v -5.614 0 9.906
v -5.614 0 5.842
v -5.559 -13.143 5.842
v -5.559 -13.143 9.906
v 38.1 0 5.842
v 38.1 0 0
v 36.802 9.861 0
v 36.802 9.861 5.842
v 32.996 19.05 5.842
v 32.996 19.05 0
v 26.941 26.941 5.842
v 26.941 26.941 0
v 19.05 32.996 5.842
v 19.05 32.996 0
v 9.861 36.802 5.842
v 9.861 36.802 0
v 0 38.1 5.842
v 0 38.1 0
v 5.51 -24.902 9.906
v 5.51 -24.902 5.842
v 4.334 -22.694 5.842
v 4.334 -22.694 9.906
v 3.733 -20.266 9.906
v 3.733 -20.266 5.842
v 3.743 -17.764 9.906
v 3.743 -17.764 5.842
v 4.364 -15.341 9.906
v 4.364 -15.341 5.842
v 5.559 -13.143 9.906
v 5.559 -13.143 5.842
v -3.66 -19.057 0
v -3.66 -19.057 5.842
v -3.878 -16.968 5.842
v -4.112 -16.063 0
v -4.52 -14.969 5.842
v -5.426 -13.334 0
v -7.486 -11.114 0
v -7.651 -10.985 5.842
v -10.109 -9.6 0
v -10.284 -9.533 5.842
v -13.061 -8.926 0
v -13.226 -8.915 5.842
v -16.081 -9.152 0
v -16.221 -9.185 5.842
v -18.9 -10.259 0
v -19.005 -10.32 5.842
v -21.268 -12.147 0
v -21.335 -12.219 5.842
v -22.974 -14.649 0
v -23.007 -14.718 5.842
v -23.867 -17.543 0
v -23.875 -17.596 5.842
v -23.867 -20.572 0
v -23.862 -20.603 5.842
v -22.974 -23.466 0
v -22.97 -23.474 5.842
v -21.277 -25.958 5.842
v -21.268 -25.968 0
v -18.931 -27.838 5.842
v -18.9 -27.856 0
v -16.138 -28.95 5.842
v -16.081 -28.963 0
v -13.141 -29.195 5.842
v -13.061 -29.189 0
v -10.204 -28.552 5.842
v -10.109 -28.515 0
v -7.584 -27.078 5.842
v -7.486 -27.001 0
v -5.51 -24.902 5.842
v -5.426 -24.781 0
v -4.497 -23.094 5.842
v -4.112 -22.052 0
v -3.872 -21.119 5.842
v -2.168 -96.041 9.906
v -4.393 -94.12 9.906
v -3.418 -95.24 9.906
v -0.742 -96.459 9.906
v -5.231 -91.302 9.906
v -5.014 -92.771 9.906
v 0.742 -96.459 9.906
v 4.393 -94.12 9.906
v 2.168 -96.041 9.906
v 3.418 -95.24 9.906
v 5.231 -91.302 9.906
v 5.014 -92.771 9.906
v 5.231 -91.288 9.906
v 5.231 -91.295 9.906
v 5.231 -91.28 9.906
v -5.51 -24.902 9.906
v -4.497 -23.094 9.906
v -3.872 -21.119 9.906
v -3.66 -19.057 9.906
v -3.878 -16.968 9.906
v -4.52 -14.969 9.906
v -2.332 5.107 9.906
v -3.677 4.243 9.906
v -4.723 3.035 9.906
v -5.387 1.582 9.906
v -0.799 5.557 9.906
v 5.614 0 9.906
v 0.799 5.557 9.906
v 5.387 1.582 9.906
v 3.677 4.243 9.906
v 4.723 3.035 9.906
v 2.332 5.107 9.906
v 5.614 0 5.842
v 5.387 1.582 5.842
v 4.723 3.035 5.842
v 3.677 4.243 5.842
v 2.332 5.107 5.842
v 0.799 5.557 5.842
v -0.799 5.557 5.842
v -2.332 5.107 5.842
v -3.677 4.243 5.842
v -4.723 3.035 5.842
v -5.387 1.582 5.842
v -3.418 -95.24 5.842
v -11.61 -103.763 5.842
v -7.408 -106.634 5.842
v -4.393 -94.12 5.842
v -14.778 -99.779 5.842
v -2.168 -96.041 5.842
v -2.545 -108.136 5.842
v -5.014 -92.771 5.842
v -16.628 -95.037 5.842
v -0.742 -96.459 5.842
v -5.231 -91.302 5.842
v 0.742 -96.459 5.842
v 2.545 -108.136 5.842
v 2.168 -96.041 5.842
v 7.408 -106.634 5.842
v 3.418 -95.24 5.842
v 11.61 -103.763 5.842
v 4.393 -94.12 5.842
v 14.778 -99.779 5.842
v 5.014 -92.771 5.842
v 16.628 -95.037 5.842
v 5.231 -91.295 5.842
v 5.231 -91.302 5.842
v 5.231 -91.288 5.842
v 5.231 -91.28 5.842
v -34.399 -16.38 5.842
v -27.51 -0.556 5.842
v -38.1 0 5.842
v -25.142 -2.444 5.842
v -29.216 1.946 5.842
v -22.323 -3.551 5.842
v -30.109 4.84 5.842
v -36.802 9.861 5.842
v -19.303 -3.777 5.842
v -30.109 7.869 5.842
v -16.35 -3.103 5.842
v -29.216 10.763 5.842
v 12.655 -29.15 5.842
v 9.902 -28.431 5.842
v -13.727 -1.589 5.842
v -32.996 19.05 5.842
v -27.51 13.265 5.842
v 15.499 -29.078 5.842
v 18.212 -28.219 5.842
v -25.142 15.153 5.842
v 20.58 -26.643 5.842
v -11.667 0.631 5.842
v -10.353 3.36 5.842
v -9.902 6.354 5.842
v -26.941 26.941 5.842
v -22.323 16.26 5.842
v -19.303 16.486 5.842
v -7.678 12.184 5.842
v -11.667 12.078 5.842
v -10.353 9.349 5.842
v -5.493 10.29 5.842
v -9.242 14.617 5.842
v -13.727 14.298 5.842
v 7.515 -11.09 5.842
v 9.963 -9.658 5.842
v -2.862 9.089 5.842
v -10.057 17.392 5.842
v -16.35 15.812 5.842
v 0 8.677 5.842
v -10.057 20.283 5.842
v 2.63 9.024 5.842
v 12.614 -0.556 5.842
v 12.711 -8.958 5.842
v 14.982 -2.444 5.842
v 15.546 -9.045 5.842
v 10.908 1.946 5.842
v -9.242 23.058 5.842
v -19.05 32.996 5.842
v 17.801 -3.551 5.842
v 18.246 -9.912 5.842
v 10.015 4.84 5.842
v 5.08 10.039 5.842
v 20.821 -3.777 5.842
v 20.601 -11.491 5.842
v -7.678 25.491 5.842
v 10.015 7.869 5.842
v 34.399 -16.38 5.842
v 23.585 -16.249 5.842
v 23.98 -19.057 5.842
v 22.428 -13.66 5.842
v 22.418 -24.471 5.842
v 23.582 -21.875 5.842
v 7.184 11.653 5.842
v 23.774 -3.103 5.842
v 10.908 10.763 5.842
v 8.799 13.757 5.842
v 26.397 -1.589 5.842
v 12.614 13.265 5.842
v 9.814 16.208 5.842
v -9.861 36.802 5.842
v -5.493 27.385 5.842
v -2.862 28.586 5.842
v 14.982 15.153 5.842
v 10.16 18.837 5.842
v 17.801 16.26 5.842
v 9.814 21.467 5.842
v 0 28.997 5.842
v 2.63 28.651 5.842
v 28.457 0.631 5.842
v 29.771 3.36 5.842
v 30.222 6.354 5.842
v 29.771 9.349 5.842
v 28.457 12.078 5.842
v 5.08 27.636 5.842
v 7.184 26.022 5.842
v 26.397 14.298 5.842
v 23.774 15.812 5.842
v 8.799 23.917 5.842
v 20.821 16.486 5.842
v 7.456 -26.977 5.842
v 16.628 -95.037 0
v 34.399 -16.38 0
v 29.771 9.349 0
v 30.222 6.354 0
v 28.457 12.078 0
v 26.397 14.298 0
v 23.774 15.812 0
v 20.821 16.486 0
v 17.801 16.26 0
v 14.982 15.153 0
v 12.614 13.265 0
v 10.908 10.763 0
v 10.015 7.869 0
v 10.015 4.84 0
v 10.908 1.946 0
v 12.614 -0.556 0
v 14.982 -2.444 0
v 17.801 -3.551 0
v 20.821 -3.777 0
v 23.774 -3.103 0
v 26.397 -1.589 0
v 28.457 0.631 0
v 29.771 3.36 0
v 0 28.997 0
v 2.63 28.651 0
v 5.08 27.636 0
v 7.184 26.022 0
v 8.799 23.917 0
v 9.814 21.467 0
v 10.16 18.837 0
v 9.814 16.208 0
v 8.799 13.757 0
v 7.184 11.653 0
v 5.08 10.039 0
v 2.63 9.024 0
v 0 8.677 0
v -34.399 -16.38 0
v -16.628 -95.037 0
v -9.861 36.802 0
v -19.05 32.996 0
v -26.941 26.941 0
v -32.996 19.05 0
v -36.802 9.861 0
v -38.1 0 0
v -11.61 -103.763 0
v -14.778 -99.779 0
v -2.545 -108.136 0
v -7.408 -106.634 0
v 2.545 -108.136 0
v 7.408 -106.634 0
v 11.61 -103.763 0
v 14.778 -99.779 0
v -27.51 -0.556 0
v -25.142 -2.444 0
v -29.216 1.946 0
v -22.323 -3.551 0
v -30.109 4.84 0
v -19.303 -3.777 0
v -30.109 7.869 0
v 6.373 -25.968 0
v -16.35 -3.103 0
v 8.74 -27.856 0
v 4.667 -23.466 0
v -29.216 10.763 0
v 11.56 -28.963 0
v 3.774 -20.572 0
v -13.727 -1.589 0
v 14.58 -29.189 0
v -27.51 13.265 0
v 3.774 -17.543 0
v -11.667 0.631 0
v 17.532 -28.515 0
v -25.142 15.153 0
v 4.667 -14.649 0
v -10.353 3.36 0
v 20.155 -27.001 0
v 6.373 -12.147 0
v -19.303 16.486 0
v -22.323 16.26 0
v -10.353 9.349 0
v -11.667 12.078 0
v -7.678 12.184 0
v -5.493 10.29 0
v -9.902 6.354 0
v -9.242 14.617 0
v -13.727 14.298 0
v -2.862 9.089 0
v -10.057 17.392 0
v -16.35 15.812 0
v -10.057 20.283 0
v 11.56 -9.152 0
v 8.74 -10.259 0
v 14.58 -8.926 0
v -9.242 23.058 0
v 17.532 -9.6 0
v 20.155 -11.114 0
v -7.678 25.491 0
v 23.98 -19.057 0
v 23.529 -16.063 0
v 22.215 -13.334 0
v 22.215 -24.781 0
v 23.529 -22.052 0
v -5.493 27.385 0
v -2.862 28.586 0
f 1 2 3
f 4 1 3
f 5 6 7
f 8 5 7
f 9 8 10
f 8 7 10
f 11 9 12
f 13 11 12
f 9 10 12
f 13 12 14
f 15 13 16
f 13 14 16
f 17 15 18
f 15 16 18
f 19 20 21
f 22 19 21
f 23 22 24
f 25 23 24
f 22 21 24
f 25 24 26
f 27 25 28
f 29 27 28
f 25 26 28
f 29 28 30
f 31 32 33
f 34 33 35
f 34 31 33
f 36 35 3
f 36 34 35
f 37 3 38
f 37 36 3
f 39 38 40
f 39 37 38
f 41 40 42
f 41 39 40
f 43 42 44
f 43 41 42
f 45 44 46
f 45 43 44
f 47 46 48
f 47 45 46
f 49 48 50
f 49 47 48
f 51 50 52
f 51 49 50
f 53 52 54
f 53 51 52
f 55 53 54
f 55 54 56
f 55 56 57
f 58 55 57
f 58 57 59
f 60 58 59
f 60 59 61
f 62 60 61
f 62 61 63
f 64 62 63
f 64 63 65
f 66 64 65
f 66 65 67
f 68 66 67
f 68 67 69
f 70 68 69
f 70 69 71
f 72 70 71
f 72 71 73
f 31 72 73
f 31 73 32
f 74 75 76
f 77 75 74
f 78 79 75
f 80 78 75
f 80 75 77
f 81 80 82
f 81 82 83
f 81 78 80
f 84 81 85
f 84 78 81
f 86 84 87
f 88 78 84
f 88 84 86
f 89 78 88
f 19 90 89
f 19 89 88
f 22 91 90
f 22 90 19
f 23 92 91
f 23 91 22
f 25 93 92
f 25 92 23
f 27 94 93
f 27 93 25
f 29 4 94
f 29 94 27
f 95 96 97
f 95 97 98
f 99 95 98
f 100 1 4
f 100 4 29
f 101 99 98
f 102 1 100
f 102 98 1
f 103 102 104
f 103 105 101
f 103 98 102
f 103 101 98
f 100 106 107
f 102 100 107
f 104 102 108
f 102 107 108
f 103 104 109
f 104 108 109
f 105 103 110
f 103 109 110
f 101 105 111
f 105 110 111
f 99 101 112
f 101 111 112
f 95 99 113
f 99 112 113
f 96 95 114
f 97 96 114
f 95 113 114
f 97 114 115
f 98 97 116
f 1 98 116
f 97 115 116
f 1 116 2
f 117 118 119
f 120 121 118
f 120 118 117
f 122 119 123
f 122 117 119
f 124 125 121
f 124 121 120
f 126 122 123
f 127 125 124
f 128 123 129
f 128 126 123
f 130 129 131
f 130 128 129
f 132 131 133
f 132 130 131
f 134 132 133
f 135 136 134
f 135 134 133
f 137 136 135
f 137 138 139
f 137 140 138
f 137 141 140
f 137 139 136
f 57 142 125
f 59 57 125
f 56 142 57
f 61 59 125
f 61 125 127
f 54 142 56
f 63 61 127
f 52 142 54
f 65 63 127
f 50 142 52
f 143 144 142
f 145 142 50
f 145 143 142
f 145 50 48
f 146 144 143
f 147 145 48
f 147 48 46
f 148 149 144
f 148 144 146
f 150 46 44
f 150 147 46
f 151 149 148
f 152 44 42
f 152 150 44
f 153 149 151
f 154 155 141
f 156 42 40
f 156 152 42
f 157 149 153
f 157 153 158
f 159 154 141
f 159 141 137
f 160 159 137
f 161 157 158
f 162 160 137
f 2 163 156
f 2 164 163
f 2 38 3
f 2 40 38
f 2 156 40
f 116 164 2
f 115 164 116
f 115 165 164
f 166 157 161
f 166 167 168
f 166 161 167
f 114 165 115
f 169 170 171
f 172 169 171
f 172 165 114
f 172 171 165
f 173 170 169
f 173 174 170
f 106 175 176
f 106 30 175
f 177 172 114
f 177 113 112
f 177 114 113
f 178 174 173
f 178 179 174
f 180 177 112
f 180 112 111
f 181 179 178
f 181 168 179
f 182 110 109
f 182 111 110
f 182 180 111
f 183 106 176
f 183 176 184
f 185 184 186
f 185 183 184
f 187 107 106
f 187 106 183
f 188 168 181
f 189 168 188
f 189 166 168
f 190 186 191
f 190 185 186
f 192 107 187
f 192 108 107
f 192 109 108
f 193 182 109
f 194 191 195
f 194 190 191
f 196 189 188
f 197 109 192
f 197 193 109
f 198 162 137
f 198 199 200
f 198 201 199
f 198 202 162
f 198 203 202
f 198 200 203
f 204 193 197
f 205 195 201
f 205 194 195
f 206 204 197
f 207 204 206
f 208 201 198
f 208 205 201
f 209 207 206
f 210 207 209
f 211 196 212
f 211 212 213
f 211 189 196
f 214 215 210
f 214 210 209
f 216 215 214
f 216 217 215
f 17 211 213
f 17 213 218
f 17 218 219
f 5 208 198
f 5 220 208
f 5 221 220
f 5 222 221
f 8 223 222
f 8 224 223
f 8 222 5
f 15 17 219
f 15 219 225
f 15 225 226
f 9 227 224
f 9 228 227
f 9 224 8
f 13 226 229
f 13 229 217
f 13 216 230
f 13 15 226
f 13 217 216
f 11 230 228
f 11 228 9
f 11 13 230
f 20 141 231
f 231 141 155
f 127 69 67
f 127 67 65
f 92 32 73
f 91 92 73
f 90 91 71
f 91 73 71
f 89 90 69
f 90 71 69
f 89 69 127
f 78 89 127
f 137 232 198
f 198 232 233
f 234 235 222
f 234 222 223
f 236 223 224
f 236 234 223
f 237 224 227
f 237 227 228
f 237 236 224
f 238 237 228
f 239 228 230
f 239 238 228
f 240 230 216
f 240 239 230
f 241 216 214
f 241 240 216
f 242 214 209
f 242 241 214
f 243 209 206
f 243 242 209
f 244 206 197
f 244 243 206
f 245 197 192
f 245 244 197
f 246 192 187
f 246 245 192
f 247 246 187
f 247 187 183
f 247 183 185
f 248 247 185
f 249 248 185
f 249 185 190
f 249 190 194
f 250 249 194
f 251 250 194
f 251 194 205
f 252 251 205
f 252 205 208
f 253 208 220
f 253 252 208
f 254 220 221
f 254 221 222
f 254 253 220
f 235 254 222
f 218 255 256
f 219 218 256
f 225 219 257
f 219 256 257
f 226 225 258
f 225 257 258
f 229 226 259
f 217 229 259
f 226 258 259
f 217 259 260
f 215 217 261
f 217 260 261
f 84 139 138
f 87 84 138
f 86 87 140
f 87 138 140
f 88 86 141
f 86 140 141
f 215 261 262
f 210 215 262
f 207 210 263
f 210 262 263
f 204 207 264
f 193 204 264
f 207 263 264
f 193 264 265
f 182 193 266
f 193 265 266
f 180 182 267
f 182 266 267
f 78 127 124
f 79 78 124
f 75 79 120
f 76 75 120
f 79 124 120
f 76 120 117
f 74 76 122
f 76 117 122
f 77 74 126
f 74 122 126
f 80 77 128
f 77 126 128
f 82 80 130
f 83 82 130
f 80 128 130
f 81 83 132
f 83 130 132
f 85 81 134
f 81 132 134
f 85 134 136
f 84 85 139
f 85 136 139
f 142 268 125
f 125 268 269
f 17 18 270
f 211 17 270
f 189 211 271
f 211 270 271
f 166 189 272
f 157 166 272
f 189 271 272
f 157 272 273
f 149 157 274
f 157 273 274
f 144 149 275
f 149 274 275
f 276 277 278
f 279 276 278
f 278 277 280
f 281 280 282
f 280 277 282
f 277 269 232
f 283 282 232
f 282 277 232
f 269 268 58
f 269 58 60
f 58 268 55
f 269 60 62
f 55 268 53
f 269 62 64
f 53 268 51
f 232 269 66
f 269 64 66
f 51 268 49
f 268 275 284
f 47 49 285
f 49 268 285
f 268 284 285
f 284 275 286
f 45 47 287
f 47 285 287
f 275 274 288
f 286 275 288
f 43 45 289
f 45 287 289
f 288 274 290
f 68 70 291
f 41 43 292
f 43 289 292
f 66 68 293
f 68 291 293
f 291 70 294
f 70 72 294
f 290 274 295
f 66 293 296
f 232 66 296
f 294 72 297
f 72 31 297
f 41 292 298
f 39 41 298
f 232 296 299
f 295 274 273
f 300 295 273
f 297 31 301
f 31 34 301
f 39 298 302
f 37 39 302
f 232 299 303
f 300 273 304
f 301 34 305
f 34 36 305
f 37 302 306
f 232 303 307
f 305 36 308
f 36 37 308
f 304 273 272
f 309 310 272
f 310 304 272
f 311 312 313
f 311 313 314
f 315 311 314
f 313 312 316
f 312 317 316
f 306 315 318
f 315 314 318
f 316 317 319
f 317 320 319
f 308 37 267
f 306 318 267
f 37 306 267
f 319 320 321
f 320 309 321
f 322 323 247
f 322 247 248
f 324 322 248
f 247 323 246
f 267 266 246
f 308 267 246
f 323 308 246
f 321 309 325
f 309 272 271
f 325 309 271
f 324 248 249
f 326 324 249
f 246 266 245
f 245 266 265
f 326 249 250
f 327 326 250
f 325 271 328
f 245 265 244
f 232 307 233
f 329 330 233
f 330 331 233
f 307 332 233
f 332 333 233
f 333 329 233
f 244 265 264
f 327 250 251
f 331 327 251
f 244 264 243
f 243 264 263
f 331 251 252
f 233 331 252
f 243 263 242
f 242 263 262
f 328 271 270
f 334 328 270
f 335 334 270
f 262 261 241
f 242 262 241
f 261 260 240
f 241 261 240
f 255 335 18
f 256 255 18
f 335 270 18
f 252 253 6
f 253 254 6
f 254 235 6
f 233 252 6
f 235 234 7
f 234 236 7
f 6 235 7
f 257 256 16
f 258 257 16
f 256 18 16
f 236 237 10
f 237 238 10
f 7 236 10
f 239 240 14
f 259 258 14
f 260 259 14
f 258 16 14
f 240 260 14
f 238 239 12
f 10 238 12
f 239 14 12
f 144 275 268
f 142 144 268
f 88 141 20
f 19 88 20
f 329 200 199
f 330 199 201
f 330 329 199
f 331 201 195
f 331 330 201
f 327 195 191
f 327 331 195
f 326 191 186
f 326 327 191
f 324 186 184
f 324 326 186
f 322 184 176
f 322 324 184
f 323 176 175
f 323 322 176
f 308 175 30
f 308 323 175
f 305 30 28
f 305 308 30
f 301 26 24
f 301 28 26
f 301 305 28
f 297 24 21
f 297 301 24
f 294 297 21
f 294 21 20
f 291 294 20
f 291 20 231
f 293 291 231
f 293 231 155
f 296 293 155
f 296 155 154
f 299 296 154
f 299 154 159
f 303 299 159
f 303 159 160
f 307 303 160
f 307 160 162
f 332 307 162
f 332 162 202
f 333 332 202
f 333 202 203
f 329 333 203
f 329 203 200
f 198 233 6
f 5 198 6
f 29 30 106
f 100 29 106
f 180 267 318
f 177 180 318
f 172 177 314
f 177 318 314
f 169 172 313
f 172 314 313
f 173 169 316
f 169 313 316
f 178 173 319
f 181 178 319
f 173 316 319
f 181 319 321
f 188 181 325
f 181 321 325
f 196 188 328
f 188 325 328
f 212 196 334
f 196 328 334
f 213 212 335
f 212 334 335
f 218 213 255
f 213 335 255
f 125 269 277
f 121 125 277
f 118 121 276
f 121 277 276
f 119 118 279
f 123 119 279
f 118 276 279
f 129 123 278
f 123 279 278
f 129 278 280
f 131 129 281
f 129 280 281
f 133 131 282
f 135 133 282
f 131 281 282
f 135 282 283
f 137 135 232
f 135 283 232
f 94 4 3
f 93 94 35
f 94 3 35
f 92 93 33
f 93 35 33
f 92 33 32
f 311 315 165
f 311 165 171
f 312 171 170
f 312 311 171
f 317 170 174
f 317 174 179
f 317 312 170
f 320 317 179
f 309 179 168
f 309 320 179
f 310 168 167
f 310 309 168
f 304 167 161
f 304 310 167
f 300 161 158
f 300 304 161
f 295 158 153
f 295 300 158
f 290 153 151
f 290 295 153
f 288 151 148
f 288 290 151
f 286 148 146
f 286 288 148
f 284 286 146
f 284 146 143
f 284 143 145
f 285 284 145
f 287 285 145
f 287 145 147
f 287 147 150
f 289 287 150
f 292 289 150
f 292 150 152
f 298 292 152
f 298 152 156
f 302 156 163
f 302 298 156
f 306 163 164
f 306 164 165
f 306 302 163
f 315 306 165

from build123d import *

# Parameters (mm, degrees)
F0_R     = 10.16
F1_DEPTH = 5.842
F2_DEPTH = 5.842
F4_DEPTH = 4.064


# Not quite as in the source:
# - after a boolean that leaves OpenCascade's solid faulty, fix() repairs it
# - ends of sketch curves that miss each other by under 0.0002 mm in the source are joined


with BuildPart() as f1:
    # F0 (on Top) → F1 (new body)
    with BuildSketch(Plane.XY):
        with BuildLine():
            Line((0, 28.9974835998), (0, 38.1))
            ThreePointArc((0, 38.1), (-26.9407683632, 26.9407683632), (-38.1, 0))
            Line((-38.1, 0), (-34.39917941, -16.3800627568))
            ThreePointArc((-34.39917941, -16.3800627568), (-20.3412095138, -32.2156048448), (0, -38.1))
            Line((0, -38.1), (0, 8.6774835998))
            ThreePointArc((0, 8.6774835998), (-10.16, 18.8374835998), (0, 28.9974835998))
        make_face()
        with Locations((-13.8204852119, -19.0573949367)):
            Circle(F0_R, mode=Mode.SUBTRACT)
        with Locations((-20.0619921088, 6.3544651493)):
            Circle(F0_R, mode=Mode.SUBTRACT)
        with BuildLine():
            Line((34.39917941, -16.3800627568), (38.1, 0))
            ThreePointArc((38.1, 0), (26.9407683632, 26.9407683632), (0, 38.1))
            Line((0, 38.1), (0, 28.9974835998))
            ThreePointArc((0, 28.9974835998), (7.1842048969, 26.0216884966), (10.16, 18.8374835998))
            ThreePointArc((10.16, 18.8374835998), (7.1842048969, 11.6532787029), (0, 8.6774835998))
            Line((0, 8.6774835998), (0, -38.1))
            ThreePointArc((0, -38.1), (20.3412095138, -32.2156048448), (34.39917941, -16.3800627568))
        make_face()
        with Locations((13.8204852119, -19.0573949367)):
            Circle(F0_R, mode=Mode.SUBTRACT)
        with Locations((20.0619921088, 6.3544651493)):
            Circle(F0_R, mode=Mode.SUBTRACT)
    extrude(amount=F1_DEPTH)

    # F0 (on Top) → F2 (join)
    with BuildSketch(Plane.XY):
        with BuildLine():
            Line((16.6278202087, -95.0372070074), (34.39917941, -16.3800627568))
            ThreePointArc((34.39917941, -16.3800627568), (20.3412095138, -32.2156048448), (0, -38.1))
            ThreePointArc((0, -38.1), (-20.3412095138, -32.2156048448), (-34.39917941, -16.3800627568))
            Line((-34.39917941, -16.3800627568), (-16.6278202087, -95.0372070074))
            ThreePointArc((-16.6278202087, -95.0372070074), (0, -108.3273427039), (16.6278202087, -95.0372070074))
        make_face()
    extrude(amount=F2_DEPTH)

    # F3 (on face) → F4 (join)
    with BuildSketch(Plane.XY.offset(5.842)):
        with BuildLine():
            Line((5.5590673185, -13.1434644002), (5.6142329033, 0))
            ThreePointArc((5.6142329033, 0), (0, 5.6142329033), (-5.6142329033, 0))
            Line((-5.6142329033, 0), (-5.5590673185, -13.1434644002))
            ThreePointArc((-5.5590673185, -13.1434644002), (-4.1467680929, -15.9517875723), (-3.6604852119, -19.0573949367))
            ThreePointArc((-3.6604852119, -19.0573949367), (-4.1338185981, -22.1223728994), (-5.5097155096, -24.9017688941))
            Line((-5.5097155096, -24.9017688941), (-5.2310197557, -91.3023650429))
            ThreePointArc((-5.2310197557, -91.3023650429), (-0.0109778096, -86.0493551595), (5.2310658314, -91.280409472))
            Line((5.2310658314, -91.280409472), (5.5097155096, -24.9017688941))
            ThreePointArc((5.5097155096, -24.9017688941), (3.660574702, -19.014751887), (5.5590673185, -13.1434644002))
        make_face()
        with BuildLine():
            ThreePointArc((5.2310197557, -91.3023650429), (5.2310543125, -91.2913872816), (5.2310658314, -91.280409472))
            ThreePointArc((5.2310658314, -91.280409472), (-0.0109778096, -86.0493551595), (-5.2310197557, -91.3023650429))
            ThreePointArc((-5.2310197557, -91.3023650429), (0, -96.5114753034), (5.2310197557, -91.3023650429))
        make_face()
    extrude(amount=F4_DEPTH)

    add(f1.part.fix(), mode=Mode.REPLACE)


solid = f1.part
